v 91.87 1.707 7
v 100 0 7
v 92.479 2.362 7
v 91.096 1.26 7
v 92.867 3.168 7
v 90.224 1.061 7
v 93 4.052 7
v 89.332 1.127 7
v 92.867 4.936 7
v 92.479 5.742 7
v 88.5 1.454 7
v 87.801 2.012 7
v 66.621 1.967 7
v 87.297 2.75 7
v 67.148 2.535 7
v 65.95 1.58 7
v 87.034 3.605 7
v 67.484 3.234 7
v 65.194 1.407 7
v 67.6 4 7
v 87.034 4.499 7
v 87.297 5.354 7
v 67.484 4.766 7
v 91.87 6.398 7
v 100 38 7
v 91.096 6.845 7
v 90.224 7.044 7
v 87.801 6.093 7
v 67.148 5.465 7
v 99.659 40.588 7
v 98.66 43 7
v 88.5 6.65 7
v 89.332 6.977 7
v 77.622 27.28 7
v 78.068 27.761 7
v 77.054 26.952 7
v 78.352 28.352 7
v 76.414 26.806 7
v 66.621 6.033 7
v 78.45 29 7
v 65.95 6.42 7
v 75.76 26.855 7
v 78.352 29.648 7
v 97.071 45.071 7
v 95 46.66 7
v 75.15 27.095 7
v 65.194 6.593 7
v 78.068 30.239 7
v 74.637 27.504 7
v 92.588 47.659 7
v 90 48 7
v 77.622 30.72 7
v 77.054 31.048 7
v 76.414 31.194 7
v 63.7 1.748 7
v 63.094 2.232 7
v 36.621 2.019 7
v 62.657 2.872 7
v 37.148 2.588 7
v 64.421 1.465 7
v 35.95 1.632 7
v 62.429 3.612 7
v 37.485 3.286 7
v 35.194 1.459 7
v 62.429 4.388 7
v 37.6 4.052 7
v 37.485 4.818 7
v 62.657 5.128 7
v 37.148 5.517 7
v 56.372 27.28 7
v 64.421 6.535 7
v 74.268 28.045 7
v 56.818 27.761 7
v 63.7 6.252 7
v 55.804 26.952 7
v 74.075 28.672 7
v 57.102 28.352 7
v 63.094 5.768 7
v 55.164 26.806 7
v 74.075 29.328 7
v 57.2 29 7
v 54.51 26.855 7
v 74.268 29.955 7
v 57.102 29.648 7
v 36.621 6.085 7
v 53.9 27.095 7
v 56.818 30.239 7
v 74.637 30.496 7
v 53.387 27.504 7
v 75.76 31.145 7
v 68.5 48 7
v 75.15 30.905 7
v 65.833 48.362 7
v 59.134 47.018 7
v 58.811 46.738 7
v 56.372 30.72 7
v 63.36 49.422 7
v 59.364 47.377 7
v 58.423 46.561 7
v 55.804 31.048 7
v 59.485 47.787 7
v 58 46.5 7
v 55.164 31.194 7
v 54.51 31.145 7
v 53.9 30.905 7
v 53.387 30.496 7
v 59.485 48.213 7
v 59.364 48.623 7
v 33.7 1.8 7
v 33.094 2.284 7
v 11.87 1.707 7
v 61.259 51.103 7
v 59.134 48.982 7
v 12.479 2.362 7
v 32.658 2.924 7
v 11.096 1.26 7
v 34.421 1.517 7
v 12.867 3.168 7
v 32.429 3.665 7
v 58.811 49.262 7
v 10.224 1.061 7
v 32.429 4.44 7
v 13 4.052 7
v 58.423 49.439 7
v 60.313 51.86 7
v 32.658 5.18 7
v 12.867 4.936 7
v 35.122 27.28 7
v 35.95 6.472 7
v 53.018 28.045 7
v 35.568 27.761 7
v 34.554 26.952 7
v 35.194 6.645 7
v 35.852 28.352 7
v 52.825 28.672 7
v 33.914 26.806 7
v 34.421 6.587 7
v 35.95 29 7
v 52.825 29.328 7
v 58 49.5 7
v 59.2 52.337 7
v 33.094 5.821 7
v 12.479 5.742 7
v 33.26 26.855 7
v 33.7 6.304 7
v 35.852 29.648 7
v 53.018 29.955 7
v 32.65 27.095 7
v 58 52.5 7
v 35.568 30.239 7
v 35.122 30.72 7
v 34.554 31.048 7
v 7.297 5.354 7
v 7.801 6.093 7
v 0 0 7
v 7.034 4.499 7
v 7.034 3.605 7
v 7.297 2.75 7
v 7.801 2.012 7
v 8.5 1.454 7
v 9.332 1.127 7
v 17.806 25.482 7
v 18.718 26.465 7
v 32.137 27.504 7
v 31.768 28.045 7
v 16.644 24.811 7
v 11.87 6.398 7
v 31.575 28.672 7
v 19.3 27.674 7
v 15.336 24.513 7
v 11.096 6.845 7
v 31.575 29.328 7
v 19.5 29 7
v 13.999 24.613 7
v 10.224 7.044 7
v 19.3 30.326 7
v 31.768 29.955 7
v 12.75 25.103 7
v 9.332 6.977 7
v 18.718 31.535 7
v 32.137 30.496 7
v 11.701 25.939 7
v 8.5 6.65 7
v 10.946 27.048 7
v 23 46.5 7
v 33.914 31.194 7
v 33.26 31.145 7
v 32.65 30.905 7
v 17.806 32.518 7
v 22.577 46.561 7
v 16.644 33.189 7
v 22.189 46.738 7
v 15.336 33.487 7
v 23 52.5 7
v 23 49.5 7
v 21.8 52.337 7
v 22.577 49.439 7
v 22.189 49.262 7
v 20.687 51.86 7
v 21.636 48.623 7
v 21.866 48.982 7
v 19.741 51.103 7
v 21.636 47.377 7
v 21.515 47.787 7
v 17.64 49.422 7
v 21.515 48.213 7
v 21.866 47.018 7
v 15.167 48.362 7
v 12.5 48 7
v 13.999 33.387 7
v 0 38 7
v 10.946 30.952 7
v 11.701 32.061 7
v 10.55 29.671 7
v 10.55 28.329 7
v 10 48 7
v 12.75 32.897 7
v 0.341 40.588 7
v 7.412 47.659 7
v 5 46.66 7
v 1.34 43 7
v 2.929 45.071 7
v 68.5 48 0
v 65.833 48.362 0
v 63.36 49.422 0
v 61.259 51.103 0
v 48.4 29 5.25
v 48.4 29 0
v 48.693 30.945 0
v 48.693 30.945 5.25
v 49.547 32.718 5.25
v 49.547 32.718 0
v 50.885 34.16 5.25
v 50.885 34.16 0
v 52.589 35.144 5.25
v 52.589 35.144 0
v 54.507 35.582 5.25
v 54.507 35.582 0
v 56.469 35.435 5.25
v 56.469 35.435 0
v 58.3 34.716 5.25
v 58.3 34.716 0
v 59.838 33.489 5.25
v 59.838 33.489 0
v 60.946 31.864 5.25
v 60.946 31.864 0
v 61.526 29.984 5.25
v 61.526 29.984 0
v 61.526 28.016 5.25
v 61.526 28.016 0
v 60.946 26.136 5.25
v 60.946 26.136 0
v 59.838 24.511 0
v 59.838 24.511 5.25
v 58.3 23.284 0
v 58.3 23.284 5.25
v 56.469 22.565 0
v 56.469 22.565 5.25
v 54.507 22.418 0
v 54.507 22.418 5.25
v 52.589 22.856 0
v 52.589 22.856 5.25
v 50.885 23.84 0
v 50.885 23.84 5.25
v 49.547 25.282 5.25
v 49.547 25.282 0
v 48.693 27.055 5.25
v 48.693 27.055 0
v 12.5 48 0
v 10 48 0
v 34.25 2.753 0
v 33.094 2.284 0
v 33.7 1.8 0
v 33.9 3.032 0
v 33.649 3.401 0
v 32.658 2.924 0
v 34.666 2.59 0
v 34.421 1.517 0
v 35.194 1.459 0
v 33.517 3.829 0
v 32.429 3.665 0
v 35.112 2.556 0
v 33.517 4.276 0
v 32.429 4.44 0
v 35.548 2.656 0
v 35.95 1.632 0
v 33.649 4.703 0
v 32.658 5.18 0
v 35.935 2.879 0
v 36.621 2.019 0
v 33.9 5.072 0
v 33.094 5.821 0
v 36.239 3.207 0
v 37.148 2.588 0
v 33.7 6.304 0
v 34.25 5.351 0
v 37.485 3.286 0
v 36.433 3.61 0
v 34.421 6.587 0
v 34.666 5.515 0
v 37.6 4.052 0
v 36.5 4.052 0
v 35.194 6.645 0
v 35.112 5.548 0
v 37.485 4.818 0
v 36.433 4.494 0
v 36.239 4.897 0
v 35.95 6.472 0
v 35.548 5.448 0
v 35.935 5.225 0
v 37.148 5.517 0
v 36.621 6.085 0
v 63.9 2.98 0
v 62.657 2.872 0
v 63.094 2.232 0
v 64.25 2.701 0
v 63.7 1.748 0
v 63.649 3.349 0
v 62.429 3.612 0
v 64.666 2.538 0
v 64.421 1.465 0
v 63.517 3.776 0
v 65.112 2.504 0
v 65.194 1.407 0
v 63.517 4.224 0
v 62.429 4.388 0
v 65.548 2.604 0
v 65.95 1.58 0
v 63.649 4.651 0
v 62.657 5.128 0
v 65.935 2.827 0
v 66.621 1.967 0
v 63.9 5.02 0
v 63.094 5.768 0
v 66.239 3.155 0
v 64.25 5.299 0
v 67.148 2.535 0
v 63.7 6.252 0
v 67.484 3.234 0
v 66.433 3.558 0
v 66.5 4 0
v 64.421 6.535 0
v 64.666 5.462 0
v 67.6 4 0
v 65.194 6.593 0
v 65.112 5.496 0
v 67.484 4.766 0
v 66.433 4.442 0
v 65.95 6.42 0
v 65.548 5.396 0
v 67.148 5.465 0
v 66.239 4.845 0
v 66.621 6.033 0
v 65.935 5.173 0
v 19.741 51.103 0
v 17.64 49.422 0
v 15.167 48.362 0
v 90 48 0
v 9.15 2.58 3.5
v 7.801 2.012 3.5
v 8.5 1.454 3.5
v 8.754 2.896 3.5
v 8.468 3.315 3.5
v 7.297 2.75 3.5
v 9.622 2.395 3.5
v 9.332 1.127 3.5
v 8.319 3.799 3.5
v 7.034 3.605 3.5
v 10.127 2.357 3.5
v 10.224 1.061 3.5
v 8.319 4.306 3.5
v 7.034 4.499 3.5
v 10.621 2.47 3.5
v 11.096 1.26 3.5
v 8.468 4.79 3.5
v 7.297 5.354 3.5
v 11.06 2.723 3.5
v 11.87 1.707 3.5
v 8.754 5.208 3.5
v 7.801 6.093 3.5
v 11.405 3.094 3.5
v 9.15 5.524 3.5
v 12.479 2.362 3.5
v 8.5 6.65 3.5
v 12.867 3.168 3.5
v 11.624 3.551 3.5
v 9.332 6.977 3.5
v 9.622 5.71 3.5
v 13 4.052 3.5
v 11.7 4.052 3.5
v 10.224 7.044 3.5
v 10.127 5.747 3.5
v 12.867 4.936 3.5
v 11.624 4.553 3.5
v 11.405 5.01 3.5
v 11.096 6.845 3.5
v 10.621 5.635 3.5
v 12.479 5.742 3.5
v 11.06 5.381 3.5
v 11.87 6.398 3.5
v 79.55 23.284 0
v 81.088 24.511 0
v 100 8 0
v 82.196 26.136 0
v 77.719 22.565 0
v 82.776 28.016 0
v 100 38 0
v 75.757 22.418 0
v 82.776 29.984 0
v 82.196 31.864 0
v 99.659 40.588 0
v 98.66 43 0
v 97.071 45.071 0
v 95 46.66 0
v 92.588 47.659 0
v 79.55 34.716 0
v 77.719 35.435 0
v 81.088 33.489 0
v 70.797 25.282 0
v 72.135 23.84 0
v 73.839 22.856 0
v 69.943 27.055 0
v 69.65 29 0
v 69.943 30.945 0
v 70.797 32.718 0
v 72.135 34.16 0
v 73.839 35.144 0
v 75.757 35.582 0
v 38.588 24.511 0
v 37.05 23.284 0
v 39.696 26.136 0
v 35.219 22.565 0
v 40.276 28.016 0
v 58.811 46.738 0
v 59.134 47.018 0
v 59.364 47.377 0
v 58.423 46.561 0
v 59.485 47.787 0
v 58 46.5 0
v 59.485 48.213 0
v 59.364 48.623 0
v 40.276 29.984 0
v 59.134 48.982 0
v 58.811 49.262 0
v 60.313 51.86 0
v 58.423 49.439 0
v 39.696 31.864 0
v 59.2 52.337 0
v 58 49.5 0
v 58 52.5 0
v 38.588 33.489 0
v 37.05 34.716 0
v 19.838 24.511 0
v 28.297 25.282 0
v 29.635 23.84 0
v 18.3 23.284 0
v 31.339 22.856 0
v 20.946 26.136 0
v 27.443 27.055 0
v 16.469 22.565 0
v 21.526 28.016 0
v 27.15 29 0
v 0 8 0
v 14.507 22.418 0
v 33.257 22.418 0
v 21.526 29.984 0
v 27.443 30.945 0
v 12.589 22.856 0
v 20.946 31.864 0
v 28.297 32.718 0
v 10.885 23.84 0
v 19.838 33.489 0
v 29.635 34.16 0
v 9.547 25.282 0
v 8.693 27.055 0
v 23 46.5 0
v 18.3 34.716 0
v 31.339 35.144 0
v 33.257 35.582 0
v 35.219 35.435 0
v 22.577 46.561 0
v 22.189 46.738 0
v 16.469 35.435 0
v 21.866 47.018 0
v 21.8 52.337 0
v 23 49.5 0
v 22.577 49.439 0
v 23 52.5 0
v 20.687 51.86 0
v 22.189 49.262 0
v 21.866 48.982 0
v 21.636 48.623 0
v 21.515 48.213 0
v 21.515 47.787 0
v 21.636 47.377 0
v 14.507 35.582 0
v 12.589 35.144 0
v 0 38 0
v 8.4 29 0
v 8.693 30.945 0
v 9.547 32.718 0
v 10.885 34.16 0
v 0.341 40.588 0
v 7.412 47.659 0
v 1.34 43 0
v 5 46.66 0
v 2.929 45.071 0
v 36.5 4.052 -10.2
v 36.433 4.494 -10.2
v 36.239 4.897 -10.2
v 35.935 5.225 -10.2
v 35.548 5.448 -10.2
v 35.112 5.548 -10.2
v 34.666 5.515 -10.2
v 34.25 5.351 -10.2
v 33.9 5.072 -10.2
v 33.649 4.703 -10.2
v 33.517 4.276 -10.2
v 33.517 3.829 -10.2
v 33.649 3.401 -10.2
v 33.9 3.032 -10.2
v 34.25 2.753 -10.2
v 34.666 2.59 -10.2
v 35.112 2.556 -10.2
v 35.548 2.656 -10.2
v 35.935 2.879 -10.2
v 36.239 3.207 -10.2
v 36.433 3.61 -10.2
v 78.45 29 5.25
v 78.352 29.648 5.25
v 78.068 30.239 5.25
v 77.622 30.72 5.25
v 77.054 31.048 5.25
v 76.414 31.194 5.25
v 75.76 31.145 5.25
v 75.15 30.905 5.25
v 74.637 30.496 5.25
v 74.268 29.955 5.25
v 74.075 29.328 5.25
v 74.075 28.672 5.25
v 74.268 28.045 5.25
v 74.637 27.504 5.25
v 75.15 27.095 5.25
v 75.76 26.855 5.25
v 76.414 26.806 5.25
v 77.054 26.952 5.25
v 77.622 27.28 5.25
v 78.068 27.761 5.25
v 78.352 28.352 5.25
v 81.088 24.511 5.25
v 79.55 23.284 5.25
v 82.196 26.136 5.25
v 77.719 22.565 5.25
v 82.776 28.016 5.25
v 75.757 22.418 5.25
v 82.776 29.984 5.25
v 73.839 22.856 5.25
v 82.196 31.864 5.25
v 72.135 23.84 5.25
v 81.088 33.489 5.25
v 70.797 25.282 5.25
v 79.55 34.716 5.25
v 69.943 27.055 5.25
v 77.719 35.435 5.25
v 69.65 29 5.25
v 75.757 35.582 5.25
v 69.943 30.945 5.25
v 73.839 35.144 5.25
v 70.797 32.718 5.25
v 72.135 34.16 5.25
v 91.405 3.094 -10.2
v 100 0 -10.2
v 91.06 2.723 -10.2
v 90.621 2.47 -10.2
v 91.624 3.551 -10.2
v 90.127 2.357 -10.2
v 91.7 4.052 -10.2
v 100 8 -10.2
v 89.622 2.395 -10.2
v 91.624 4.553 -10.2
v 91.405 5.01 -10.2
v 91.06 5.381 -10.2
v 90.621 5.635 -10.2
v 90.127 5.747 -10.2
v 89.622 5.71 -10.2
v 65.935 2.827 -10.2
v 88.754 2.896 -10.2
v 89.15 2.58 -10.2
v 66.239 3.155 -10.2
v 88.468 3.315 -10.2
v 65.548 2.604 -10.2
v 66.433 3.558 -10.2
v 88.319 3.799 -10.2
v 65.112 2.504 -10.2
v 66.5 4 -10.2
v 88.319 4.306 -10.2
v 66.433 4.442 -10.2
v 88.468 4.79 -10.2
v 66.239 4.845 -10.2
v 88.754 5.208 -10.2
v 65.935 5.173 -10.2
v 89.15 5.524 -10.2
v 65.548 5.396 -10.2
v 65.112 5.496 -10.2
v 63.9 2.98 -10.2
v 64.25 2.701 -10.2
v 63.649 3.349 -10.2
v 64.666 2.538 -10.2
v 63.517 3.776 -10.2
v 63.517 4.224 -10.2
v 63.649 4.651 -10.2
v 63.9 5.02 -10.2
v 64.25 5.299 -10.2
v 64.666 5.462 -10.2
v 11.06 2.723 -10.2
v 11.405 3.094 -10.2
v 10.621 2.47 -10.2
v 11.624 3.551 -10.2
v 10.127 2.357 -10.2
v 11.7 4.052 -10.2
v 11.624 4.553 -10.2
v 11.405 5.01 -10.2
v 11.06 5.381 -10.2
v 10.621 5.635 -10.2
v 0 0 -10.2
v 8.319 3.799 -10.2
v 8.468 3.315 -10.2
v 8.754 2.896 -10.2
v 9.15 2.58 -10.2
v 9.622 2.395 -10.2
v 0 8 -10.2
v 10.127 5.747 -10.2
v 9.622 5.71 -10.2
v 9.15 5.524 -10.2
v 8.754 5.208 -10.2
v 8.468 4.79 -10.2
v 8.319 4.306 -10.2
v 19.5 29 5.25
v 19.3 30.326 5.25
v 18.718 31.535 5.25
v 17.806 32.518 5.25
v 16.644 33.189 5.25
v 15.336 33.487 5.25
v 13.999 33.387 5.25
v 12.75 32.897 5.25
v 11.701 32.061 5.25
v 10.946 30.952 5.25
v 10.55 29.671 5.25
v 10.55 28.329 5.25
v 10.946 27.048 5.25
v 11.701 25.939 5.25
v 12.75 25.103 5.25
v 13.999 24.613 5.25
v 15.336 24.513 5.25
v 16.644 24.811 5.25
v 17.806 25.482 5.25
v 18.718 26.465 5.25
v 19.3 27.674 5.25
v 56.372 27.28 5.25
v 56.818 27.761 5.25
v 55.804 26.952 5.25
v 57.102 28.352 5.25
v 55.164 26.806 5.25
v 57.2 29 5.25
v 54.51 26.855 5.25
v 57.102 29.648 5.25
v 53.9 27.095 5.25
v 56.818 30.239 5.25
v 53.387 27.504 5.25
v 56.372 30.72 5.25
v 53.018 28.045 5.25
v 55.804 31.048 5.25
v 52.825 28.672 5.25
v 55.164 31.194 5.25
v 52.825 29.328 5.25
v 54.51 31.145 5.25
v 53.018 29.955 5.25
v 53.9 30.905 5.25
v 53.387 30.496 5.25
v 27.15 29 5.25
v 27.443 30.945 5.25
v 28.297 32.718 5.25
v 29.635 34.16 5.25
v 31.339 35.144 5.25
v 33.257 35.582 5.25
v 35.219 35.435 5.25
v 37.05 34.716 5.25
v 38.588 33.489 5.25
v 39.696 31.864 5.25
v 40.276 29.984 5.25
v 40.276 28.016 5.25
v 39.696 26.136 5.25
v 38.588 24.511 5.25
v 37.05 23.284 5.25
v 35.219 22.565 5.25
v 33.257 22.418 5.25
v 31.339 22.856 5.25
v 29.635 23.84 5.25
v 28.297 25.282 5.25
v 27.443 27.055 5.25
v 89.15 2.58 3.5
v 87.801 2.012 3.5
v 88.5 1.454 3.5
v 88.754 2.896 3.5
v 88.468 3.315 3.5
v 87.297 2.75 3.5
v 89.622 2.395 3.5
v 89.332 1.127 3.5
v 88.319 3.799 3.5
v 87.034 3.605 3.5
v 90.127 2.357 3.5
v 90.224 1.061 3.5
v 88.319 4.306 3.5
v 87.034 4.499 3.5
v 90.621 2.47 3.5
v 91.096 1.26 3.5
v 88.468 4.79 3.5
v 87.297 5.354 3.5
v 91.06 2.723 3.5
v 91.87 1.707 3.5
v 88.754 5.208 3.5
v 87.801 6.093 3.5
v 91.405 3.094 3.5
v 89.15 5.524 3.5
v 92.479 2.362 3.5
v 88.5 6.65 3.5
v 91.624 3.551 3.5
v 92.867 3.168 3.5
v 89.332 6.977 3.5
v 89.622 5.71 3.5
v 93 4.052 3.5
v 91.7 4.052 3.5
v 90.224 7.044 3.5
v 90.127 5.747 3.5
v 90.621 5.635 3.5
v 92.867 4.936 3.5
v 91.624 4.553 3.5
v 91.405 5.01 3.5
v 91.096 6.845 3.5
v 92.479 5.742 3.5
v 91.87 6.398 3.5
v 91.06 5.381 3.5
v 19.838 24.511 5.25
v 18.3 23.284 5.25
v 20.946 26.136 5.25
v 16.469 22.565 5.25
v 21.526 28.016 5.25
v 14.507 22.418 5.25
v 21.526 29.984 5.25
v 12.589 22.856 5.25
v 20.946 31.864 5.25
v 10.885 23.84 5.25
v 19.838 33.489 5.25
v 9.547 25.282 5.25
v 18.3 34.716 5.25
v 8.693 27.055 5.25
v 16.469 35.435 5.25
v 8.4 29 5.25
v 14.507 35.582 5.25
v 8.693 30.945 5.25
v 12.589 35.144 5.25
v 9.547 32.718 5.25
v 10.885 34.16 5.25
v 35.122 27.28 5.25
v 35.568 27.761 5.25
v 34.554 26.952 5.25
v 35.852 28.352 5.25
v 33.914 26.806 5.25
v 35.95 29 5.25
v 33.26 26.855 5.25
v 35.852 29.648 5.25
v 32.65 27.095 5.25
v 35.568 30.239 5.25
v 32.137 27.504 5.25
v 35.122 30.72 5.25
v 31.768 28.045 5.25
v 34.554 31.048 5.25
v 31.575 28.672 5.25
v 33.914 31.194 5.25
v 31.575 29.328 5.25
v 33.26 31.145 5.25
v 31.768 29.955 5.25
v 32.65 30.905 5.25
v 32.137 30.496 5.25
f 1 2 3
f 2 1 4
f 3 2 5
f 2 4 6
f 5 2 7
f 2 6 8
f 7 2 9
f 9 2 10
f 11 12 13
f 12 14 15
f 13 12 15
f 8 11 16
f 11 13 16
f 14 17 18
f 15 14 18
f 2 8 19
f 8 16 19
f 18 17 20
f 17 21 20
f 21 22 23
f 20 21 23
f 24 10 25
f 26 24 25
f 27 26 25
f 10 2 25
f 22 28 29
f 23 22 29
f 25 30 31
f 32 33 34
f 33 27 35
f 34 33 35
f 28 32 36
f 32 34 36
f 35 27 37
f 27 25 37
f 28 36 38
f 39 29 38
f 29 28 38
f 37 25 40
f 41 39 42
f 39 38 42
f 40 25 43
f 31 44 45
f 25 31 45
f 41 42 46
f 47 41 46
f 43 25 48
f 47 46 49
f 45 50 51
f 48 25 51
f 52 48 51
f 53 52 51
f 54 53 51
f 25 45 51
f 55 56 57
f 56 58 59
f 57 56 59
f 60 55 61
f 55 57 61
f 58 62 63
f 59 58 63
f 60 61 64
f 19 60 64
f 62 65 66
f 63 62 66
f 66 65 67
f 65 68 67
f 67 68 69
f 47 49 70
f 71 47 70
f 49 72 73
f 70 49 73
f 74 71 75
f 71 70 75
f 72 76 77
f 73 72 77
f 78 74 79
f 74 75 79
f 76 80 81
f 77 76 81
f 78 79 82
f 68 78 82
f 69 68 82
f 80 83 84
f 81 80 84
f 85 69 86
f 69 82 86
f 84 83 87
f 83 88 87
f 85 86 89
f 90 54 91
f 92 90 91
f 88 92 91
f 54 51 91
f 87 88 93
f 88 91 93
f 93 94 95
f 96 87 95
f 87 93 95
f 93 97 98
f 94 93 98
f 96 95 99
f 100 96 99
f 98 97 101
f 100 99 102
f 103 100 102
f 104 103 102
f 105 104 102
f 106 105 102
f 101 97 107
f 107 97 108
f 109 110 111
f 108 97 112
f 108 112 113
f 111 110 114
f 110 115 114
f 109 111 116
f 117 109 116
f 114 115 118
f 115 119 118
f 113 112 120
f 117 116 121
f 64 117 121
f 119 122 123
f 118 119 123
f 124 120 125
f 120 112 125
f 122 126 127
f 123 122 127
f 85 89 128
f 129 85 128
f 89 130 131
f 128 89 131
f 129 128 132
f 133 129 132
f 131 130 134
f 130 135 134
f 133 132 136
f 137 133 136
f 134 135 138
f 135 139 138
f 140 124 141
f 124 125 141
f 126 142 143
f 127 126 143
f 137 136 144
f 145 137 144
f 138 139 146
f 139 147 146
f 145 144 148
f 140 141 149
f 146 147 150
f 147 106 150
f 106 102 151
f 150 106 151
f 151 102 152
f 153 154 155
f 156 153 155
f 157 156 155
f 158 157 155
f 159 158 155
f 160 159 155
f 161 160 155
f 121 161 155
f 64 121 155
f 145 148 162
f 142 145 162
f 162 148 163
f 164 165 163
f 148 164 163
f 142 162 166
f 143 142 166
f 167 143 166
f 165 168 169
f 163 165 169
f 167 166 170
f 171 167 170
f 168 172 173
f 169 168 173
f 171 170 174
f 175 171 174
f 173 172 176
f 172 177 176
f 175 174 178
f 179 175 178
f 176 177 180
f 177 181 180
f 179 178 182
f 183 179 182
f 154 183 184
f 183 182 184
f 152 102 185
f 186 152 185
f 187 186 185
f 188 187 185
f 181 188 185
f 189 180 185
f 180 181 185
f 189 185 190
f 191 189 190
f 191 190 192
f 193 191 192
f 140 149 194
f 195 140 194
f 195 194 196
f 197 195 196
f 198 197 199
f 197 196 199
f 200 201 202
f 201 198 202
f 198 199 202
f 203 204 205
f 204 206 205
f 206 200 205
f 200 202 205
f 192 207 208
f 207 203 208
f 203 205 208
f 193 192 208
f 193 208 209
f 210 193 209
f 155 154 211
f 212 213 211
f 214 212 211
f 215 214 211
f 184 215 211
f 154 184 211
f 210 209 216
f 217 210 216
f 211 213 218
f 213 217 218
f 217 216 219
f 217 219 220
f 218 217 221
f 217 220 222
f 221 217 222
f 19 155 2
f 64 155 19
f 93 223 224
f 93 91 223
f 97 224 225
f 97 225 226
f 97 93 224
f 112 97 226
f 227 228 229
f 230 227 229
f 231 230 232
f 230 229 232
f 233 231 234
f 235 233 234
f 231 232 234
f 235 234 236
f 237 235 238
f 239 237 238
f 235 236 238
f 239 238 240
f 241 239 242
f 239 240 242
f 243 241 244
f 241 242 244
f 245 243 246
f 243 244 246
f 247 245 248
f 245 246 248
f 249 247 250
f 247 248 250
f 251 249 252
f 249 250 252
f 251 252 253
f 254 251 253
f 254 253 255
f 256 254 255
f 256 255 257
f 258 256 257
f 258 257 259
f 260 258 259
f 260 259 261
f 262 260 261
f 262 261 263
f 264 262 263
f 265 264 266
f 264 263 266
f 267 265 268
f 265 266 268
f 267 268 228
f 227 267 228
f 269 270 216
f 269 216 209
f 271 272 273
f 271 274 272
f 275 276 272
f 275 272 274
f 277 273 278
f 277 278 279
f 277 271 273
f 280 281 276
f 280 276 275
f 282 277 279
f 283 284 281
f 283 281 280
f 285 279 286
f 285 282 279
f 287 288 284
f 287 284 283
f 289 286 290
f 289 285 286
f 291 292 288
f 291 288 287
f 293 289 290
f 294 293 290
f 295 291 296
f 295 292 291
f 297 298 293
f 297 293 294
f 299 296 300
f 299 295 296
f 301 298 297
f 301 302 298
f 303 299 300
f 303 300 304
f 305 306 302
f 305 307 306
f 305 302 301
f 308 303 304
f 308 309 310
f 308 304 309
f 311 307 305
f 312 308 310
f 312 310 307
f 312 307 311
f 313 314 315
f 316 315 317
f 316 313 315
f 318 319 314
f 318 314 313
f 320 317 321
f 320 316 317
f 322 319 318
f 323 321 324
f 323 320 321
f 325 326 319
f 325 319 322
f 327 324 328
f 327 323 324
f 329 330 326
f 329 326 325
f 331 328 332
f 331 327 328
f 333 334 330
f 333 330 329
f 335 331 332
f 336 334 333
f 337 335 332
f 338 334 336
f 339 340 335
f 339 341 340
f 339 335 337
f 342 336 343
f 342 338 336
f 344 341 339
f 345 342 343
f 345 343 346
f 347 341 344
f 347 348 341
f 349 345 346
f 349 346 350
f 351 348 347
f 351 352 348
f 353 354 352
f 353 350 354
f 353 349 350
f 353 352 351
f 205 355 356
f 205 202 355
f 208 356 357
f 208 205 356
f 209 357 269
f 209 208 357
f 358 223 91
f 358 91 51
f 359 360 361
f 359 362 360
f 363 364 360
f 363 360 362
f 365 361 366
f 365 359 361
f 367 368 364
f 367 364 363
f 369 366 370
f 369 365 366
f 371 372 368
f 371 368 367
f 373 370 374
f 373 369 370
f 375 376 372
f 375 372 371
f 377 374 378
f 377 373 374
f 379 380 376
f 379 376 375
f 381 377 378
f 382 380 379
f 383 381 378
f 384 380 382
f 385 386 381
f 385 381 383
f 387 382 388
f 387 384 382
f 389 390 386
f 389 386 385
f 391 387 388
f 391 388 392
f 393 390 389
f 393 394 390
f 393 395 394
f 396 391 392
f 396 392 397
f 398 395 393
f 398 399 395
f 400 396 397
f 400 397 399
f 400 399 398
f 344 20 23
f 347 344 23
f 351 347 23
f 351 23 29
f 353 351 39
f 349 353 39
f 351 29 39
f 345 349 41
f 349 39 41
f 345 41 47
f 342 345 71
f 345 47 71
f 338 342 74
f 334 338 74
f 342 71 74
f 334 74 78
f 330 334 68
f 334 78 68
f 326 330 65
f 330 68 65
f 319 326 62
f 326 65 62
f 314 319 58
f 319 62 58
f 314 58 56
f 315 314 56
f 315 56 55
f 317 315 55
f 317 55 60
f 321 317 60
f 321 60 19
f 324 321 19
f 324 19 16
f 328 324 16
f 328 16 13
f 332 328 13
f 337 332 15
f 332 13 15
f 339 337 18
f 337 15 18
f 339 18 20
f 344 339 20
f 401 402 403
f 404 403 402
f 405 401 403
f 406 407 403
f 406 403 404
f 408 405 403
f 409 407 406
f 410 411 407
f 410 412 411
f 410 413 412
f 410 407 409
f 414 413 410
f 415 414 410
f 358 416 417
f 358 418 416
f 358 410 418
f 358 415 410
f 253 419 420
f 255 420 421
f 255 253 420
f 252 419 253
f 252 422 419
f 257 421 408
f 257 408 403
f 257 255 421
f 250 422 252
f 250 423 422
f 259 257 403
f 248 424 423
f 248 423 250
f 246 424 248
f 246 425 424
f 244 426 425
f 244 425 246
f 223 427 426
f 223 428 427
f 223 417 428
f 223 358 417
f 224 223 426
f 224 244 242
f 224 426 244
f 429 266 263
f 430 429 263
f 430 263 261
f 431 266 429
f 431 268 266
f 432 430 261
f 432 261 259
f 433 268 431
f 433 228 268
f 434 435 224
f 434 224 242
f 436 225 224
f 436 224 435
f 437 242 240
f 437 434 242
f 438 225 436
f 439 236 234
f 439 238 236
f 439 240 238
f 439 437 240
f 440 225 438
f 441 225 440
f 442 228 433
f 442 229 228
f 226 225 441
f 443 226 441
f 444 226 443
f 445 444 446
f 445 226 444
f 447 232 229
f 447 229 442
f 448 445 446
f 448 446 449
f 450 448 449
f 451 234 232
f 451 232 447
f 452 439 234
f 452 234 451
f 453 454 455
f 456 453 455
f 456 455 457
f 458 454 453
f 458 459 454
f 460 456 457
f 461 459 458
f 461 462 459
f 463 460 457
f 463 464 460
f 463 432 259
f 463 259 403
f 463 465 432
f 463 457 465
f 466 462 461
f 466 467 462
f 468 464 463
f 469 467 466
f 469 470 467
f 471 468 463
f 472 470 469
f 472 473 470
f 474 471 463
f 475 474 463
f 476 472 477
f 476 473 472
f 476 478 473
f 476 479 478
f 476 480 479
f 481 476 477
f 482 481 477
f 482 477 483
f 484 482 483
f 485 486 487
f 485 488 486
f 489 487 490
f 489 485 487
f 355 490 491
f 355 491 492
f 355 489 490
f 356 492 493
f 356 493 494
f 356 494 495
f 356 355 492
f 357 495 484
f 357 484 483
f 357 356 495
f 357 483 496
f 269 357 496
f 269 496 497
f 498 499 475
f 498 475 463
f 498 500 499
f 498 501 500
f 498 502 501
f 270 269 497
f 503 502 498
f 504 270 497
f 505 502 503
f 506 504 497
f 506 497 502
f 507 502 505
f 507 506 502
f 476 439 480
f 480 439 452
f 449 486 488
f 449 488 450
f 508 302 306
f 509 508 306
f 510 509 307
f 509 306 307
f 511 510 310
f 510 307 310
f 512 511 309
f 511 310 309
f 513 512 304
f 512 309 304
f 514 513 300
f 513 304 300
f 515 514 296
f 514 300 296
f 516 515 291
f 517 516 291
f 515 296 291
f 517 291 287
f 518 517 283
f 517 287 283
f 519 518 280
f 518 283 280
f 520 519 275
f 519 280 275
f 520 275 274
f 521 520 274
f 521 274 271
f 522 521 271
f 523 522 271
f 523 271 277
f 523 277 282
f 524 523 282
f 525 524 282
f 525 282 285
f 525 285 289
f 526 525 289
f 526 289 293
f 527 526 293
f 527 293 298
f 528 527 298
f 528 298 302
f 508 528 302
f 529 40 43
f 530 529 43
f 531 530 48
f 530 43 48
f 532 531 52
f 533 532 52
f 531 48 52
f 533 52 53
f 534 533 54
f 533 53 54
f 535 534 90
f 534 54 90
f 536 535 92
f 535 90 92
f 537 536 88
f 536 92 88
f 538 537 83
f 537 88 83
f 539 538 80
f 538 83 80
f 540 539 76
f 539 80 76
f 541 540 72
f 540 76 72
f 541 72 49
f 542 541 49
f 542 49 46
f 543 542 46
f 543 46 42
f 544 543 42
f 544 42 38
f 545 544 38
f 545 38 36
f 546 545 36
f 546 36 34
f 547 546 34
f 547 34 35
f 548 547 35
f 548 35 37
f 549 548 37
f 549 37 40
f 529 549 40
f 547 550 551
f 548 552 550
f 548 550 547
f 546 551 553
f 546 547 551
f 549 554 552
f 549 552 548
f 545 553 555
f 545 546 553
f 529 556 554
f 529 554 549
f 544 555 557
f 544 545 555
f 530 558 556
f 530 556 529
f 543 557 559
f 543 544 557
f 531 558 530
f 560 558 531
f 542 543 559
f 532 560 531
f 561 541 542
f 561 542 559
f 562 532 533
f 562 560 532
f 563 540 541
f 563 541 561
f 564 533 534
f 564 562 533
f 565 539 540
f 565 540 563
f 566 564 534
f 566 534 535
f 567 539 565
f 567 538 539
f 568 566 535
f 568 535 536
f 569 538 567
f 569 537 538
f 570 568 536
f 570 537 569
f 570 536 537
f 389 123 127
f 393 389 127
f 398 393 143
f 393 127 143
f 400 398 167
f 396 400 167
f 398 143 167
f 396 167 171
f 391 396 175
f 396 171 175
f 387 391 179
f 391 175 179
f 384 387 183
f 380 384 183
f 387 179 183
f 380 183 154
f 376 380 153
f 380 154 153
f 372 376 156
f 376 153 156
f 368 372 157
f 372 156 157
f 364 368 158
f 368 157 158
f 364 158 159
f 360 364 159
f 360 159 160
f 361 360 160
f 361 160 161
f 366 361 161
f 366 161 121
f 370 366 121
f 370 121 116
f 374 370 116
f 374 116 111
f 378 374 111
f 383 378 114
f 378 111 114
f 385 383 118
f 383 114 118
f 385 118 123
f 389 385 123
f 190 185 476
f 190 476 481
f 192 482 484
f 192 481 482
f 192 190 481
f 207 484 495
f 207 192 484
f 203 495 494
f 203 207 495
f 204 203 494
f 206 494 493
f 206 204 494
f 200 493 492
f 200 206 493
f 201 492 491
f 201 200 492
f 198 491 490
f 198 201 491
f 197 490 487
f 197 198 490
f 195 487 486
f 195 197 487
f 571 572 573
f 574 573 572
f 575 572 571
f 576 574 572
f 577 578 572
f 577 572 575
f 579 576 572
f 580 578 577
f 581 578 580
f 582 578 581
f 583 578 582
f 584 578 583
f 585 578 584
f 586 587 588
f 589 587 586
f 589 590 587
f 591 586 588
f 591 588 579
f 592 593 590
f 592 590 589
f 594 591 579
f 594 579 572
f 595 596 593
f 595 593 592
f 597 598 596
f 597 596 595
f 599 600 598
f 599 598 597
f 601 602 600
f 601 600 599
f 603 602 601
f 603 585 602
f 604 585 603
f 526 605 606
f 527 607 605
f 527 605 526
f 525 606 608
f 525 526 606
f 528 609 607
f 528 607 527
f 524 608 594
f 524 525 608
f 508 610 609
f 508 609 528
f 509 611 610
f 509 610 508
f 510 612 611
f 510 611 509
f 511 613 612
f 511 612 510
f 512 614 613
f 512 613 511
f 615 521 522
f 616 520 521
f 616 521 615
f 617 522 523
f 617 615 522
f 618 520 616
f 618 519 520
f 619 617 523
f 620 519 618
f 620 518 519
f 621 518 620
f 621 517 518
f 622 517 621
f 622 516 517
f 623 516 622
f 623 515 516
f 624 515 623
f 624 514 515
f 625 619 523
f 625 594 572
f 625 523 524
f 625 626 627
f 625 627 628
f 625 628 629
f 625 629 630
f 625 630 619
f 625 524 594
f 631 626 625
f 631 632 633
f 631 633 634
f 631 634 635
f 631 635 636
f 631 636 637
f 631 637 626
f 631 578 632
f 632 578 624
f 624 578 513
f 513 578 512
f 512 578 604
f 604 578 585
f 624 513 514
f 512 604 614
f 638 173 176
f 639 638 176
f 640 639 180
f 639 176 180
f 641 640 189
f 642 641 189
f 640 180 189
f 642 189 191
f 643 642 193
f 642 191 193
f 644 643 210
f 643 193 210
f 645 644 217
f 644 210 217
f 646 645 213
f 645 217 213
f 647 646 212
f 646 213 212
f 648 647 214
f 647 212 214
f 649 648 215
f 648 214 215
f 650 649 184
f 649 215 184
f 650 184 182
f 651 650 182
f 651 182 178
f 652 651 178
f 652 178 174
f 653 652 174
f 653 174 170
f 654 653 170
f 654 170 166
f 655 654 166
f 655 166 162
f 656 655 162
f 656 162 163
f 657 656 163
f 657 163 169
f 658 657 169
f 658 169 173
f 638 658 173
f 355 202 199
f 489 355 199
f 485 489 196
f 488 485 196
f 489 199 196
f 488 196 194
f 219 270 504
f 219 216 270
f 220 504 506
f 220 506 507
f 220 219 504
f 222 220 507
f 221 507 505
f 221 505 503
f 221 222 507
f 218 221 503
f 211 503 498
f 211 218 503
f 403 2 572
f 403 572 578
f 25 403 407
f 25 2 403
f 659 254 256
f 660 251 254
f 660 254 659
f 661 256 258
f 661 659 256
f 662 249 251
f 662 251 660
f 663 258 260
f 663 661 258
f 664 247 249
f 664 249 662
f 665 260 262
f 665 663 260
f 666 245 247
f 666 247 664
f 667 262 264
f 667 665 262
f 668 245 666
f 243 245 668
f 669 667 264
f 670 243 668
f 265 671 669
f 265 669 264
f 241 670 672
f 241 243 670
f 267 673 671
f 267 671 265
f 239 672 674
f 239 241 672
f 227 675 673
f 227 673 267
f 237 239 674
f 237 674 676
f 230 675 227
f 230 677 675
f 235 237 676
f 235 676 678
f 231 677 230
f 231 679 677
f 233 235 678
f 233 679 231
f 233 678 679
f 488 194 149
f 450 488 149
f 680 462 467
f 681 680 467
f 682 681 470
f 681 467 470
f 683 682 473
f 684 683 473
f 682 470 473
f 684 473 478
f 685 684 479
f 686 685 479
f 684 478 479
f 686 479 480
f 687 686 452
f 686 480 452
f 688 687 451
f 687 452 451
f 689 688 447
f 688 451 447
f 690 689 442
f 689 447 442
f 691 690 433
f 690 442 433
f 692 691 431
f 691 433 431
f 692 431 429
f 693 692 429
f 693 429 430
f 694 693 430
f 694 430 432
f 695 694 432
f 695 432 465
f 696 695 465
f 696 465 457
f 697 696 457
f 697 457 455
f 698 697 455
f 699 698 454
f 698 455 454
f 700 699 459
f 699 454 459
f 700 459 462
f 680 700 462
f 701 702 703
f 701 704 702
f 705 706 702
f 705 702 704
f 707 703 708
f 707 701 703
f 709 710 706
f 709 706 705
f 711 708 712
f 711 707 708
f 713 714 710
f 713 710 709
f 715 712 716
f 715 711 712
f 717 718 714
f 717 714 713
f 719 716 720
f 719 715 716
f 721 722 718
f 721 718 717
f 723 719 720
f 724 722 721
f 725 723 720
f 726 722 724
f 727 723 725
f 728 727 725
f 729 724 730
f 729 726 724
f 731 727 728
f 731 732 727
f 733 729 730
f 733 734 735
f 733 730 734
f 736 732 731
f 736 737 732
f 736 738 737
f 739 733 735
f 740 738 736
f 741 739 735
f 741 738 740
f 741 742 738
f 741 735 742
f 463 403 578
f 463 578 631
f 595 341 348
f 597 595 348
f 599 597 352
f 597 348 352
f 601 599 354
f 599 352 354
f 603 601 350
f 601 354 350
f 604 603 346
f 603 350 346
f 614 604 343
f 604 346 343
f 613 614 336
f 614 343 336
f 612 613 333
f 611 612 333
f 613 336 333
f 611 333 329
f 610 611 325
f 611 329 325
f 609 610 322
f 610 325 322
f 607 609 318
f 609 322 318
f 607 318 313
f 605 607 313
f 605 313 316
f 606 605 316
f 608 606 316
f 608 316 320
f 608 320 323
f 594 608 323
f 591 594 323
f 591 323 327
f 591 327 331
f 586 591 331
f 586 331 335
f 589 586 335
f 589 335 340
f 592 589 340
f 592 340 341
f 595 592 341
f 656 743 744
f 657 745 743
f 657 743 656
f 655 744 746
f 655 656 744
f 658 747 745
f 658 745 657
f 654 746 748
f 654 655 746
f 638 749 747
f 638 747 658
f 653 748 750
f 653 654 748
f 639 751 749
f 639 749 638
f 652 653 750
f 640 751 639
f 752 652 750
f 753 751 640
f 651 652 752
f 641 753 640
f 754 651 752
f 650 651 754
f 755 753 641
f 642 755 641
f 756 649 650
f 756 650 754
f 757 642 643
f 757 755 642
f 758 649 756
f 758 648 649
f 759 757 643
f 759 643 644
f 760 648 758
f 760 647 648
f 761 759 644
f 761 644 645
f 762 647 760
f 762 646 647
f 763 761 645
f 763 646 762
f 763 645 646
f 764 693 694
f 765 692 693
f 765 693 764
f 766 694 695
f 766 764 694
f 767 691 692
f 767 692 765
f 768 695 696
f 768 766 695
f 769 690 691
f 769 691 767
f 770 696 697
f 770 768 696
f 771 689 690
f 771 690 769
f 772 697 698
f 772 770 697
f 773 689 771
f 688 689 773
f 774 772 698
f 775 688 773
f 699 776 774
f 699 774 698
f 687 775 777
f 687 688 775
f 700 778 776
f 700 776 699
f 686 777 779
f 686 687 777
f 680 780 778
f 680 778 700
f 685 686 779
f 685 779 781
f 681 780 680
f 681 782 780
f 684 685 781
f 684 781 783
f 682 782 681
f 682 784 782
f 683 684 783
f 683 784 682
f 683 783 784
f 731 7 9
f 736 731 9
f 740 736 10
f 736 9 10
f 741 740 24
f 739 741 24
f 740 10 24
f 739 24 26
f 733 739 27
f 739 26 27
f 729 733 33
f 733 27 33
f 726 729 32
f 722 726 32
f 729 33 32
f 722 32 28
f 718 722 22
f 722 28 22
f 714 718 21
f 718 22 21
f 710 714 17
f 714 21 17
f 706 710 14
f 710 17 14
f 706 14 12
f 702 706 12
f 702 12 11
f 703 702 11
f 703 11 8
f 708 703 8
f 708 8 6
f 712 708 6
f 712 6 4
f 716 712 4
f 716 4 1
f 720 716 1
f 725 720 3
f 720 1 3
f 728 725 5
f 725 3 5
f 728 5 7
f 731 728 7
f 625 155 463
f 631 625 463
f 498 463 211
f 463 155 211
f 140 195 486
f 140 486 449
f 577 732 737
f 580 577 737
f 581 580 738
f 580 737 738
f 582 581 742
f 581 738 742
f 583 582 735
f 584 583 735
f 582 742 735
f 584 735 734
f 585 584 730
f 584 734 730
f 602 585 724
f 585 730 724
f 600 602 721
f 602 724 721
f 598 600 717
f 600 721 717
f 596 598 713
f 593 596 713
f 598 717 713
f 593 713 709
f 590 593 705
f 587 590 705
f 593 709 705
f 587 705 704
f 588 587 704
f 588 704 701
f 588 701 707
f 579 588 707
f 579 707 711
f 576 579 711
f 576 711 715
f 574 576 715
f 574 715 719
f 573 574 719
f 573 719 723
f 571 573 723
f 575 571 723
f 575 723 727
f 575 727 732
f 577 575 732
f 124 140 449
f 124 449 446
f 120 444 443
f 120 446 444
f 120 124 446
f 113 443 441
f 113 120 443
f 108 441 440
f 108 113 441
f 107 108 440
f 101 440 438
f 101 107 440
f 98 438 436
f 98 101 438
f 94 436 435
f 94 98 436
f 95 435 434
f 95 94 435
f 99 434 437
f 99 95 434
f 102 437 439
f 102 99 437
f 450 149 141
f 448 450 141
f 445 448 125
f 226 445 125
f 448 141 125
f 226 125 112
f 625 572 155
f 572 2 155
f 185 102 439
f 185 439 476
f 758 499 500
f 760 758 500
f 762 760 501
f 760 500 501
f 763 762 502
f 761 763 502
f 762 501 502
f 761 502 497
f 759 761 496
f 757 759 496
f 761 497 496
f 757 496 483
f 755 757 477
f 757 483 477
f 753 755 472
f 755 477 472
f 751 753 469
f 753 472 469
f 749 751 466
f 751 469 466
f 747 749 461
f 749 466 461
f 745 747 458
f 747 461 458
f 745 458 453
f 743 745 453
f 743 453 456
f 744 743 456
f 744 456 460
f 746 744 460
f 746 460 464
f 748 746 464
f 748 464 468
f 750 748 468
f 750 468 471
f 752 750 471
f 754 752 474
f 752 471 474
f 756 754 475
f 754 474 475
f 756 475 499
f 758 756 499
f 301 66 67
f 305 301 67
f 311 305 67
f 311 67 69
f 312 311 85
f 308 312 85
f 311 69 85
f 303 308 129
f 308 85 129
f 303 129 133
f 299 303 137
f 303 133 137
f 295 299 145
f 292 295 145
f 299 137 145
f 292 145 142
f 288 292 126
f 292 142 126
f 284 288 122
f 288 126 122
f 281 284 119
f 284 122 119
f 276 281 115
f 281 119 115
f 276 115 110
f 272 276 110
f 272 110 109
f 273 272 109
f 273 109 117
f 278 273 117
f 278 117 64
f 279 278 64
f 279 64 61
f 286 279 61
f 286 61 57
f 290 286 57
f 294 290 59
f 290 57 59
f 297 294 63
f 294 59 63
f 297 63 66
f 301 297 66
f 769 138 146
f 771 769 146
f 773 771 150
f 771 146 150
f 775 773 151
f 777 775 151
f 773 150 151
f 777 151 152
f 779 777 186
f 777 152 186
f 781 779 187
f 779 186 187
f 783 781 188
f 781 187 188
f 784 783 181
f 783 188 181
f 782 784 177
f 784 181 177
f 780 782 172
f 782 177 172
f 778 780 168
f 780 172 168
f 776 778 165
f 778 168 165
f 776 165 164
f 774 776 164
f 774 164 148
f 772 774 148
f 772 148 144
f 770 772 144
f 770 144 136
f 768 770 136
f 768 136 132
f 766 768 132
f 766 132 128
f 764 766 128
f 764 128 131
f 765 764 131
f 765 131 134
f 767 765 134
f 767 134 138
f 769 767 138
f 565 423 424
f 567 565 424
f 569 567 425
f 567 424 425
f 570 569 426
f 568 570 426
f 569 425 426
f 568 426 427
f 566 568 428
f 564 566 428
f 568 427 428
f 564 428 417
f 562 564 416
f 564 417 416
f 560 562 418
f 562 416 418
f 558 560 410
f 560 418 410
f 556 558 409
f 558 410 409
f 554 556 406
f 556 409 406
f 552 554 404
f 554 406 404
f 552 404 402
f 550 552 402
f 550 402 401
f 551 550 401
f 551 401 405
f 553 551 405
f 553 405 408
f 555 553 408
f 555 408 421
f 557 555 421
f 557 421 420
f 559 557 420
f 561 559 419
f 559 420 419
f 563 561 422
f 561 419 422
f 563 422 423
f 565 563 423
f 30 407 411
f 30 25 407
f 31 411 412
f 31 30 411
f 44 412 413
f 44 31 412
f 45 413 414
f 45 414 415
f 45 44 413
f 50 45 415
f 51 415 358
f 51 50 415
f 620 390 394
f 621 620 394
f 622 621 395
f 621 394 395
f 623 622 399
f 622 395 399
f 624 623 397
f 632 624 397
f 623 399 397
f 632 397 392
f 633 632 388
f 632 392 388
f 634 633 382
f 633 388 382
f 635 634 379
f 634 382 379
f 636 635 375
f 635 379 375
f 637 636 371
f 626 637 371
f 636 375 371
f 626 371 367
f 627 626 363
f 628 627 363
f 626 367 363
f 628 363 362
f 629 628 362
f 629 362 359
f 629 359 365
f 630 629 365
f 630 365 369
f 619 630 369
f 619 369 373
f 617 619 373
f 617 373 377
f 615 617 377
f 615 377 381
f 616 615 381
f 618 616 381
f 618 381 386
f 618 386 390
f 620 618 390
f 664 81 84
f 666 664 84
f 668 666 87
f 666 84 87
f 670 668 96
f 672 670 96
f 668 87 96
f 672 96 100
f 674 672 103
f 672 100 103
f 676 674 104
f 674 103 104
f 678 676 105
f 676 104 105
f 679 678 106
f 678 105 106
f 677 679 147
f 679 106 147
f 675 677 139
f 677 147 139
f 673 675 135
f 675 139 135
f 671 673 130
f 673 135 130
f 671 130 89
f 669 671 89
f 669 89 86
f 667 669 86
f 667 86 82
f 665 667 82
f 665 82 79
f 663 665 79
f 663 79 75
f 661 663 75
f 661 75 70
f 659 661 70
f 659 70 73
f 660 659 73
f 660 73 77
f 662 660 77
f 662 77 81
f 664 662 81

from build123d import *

# Parameters (mm, degrees)
SKETCH1_W           = 100
SKETCH1_H           = 48
BOSS_EXTRUDE1_DEPTH = 7
CUT_EXTRUDE1_REACH  = 113.144
SKETCH2_R           = 4.5
SKETCH2_R_2         = 2.2
SKETCH3_W           = 100
SKETCH3_H           = 8
BOSS_EXTRUDE2_DEPTH = 10.2
SKETCH4_R           = 6.6
CUT_EXTRUDE2_DEPTH  = 5.25
SKETCH5_R           = 2.6
CUT_EXTRUDE3_DEPTH  = 7
SKETCH7_R           = 1.5
CUT_EXTRUDE4_DEPTH  = 112.391382072
CUT_EXTRUDE5_REACH  = 114.249
SKETCH8_R           = 1.7
SKETCH9_R           = 3
CUT_EXTRUDE6_DEPTH  = 3.5
BOSS_EXTRUDE3_DEPTH = 7
CUT_EXTRUDE7_REACH  = 116.246
FILLET1_R           = 10
FILLET2_R           = 10


with BuildPart() as part:
    # Sketch1 → Boss-Extrude1 (new body)
    with BuildSketch(Plane.XY):
        with Locations((50, 24)):
            Rectangle(SKETCH1_W, SKETCH1_H)
    extrude(amount=BOSS_EXTRUDE1_DEPTH)

    # Sketch2 → Cut-Extrude1 (cut, up to next)
    with BuildSketch(Plane.XY.offset(7), mode=Mode.PRIVATE) as cut_extrude1_sk1:
        with Locations((15, 29)):
            Circle(SKETCH2_R)
    cut_extrude1_tool1 = extrude(cut_extrude1_sk1.sketch, amount=-CUT_EXTRUDE1_REACH, mode=Mode.PRIVATE) & part.part
    # Sketch2 → Cut-Extrude1 (cut, up to next)
    with BuildSketch(Plane.XY.offset(7), mode=Mode.PRIVATE) as cut_extrude1_sk2:
        with Locations((33.75, 29)):
            Circle(SKETCH2_R_2)
    cut_extrude1_tool2 = extrude(cut_extrude1_sk2.sketch, amount=-CUT_EXTRUDE1_REACH, mode=Mode.PRIVATE) & part.part
    # Sketch2 → Cut-Extrude1 (cut, up to next)
    with BuildSketch(Plane.XY.offset(7), mode=Mode.PRIVATE) as cut_extrude1_sk3:
        with Locations((55, 29)):
            Circle(SKETCH2_R_2)
    cut_extrude1_tool3 = extrude(cut_extrude1_sk3.sketch, amount=-CUT_EXTRUDE1_REACH, mode=Mode.PRIVATE) & part.part
    # Sketch2 → Cut-Extrude1 (cut, up to next)
    with BuildSketch(Plane.XY.offset(7), mode=Mode.PRIVATE) as cut_extrude1_sk4:
        with Locations((76.25, 29)):
            Circle(SKETCH2_R_2)
    cut_extrude1_tool4 = extrude(cut_extrude1_sk4.sketch, amount=-CUT_EXTRUDE1_REACH, mode=Mode.PRIVATE) & part.part
    add(cut_extrude1_tool1.solids().sort_by_distance((15, 29, 7))[0], mode=Mode.SUBTRACT)
    add(cut_extrude1_tool2.solids().sort_by_distance((33.75, 29, 7))[0], mode=Mode.SUBTRACT)
    add(cut_extrude1_tool3.solids().sort_by_distance((55, 29, 7))[0], mode=Mode.SUBTRACT)
    add(cut_extrude1_tool4.solids().sort_by_distance((76.25, 29, 7))[0], mode=Mode.SUBTRACT)

    # Sketch3 → Boss-Extrude2 (add)
    with BuildSketch(Plane(origin=(0, 0, 0), x_dir=(-1, 0, 0), z_dir=(0, 0, -1))):
        with Locations((-50, 4)):
            Rectangle(SKETCH3_W, SKETCH3_H)
    extrude(amount=BOSS_EXTRUDE2_DEPTH)

    # Sketch4 → Cut-Extrude2 (cut)
    with BuildSketch(Plane(origin=(0, 0, 0), x_dir=(-1, 0, 0), z_dir=(0, 0, -1))):
        with Locations((-76.25, 29)):
            Circle(SKETCH4_R)
        with Locations((-55, 29)):
            Circle(SKETCH4_R)
        with Locations((-33.75, 29)):
            Circle(SKETCH4_R)
        with Locations((-15, 29)):
            Circle(SKETCH4_R)
    extrude(amount=-CUT_EXTRUDE2_DEPTH, mode=Mode.SUBTRACT)

    # Sketch5 → Cut-Extrude3 (cut)
    with BuildSketch(Plane.XY.offset(7)):
        with Locations((35.000022648, 4.052132501)):
            Circle(SKETCH5_R)
        with Locations((64.999977352, 4)):
            Circle(SKETCH5_R)
    extrude(amount=-CUT_EXTRUDE3_DEPTH, mode=Mode.SUBTRACT)

    # Sketch7 → Cut-Extrude4 (cut, through all)
    with BuildSketch(Plane.XY):
        with Locations((35.000022648, 4.052132501)):
            Circle(SKETCH7_R)
        with Locations((64.999977352, 4)):
            Circle(SKETCH7_R)
    extrude(amount=-CUT_EXTRUDE4_DEPTH, mode=Mode.SUBTRACT)

    # Sketch8 → Cut-Extrude5 (cut, up to next)
    with BuildSketch(Plane.XY.offset(7), mode=Mode.PRIVATE) as cut_extrude5_sk1:
        with Locations((10, 4.052132501)):
            Circle(SKETCH8_R)
    cut_extrude5_tool1 = extrude(cut_extrude5_sk1.sketch, amount=-CUT_EXTRUDE5_REACH, mode=Mode.PRIVATE) & part.part
    # Sketch8 → Cut-Extrude5 (cut, up to next)
    with BuildSketch(Plane.XY.offset(7), mode=Mode.PRIVATE) as cut_extrude5_sk2:
        with Locations((90, 4.052132501)):
            Circle(SKETCH8_R)
    cut_extrude5_tool2 = extrude(cut_extrude5_sk2.sketch, amount=-CUT_EXTRUDE5_REACH, mode=Mode.PRIVATE) & part.part
    add(cut_extrude5_tool1.solids().sort_by_distance((10, 4.052133, 7))[0], mode=Mode.SUBTRACT)
    add(cut_extrude5_tool2.solids().sort_by_distance((90, 4.052133, 7))[0], mode=Mode.SUBTRACT)

    # Sketch9 → Cut-Extrude6 (cut)
    with BuildSketch(Plane.XY.offset(7)):
        with Locations((10, 4.052132501)):
            Circle(SKETCH9_R)
        with Locations((90, 4.052132501)):
            Circle(SKETCH9_R)
    extrude(amount=-CUT_EXTRUDE6_DEPTH, mode=Mode.SUBTRACT)

    # Sketch10 → Boss-Extrude3 (add)
    with BuildSketch(Plane.XY.offset(7)):
        with BuildLine():
            Line((23, 52.5), (58, 52.5))
            ThreePointArc((58, 52.5), (62.5, 48), (58, 43.5))
            Line((58, 43.5), (23, 43.5))
            ThreePointArc((23, 43.5), (18.5, 48), (23, 52.5))
        make_face()
        with BuildLine():
            Line((23, 49.5), (58, 49.5))
            ThreePointArc((58, 49.5), (59.5, 48), (58, 46.5))
            Line((58, 46.5), (23, 46.5))
            ThreePointArc((23, 46.5), (21.5, 48), (23, 49.5))
        make_face(mode=Mode.SUBTRACT)
    extrude(amount=-BOSS_EXTRUDE3_DEPTH)

    # Sketch11 → Cut-Extrude7 (cut, up to next)
    with BuildSketch(Plane.XY.offset(7), mode=Mode.PRIVATE) as cut_extrude7_sk1:
        with BuildLine():
            Line((23, 49.5), (58, 49.5))
            ThreePointArc((58, 49.5), (59.5, 48), (58, 46.5))
            Line((58, 46.5), (23, 46.5))
            ThreePointArc((23, 46.5), (21.5, 48), (23, 49.5))
        make_face()
    cut_extrude7_tool1 = extrude(cut_extrude7_sk1.sketch, amount=-CUT_EXTRUDE7_REACH, mode=Mode.PRIVATE) & part.part
    add(cut_extrude7_tool1.solids().sort_by_distance((40.5, 48, 7))[0], mode=Mode.SUBTRACT)

    # Fillet1
    fillet1_edges = [part.edges().sort_by_distance(p)[0] for p in [
        (0, 48, 3.5),
        (100, 48, 3.5),
    ]]
    fillet(fillet1_edges, radius=FILLET1_R)

    # Fillet2
    fillet2_edges = [part.edges().sort_by_distance(p)[0] for p in [
        (18.5, 48, 3.5),
        (62.5, 48, 3.5),
    ]]
    fillet(fillet2_edges, radius=FILLET2_R)


solid = part.part
